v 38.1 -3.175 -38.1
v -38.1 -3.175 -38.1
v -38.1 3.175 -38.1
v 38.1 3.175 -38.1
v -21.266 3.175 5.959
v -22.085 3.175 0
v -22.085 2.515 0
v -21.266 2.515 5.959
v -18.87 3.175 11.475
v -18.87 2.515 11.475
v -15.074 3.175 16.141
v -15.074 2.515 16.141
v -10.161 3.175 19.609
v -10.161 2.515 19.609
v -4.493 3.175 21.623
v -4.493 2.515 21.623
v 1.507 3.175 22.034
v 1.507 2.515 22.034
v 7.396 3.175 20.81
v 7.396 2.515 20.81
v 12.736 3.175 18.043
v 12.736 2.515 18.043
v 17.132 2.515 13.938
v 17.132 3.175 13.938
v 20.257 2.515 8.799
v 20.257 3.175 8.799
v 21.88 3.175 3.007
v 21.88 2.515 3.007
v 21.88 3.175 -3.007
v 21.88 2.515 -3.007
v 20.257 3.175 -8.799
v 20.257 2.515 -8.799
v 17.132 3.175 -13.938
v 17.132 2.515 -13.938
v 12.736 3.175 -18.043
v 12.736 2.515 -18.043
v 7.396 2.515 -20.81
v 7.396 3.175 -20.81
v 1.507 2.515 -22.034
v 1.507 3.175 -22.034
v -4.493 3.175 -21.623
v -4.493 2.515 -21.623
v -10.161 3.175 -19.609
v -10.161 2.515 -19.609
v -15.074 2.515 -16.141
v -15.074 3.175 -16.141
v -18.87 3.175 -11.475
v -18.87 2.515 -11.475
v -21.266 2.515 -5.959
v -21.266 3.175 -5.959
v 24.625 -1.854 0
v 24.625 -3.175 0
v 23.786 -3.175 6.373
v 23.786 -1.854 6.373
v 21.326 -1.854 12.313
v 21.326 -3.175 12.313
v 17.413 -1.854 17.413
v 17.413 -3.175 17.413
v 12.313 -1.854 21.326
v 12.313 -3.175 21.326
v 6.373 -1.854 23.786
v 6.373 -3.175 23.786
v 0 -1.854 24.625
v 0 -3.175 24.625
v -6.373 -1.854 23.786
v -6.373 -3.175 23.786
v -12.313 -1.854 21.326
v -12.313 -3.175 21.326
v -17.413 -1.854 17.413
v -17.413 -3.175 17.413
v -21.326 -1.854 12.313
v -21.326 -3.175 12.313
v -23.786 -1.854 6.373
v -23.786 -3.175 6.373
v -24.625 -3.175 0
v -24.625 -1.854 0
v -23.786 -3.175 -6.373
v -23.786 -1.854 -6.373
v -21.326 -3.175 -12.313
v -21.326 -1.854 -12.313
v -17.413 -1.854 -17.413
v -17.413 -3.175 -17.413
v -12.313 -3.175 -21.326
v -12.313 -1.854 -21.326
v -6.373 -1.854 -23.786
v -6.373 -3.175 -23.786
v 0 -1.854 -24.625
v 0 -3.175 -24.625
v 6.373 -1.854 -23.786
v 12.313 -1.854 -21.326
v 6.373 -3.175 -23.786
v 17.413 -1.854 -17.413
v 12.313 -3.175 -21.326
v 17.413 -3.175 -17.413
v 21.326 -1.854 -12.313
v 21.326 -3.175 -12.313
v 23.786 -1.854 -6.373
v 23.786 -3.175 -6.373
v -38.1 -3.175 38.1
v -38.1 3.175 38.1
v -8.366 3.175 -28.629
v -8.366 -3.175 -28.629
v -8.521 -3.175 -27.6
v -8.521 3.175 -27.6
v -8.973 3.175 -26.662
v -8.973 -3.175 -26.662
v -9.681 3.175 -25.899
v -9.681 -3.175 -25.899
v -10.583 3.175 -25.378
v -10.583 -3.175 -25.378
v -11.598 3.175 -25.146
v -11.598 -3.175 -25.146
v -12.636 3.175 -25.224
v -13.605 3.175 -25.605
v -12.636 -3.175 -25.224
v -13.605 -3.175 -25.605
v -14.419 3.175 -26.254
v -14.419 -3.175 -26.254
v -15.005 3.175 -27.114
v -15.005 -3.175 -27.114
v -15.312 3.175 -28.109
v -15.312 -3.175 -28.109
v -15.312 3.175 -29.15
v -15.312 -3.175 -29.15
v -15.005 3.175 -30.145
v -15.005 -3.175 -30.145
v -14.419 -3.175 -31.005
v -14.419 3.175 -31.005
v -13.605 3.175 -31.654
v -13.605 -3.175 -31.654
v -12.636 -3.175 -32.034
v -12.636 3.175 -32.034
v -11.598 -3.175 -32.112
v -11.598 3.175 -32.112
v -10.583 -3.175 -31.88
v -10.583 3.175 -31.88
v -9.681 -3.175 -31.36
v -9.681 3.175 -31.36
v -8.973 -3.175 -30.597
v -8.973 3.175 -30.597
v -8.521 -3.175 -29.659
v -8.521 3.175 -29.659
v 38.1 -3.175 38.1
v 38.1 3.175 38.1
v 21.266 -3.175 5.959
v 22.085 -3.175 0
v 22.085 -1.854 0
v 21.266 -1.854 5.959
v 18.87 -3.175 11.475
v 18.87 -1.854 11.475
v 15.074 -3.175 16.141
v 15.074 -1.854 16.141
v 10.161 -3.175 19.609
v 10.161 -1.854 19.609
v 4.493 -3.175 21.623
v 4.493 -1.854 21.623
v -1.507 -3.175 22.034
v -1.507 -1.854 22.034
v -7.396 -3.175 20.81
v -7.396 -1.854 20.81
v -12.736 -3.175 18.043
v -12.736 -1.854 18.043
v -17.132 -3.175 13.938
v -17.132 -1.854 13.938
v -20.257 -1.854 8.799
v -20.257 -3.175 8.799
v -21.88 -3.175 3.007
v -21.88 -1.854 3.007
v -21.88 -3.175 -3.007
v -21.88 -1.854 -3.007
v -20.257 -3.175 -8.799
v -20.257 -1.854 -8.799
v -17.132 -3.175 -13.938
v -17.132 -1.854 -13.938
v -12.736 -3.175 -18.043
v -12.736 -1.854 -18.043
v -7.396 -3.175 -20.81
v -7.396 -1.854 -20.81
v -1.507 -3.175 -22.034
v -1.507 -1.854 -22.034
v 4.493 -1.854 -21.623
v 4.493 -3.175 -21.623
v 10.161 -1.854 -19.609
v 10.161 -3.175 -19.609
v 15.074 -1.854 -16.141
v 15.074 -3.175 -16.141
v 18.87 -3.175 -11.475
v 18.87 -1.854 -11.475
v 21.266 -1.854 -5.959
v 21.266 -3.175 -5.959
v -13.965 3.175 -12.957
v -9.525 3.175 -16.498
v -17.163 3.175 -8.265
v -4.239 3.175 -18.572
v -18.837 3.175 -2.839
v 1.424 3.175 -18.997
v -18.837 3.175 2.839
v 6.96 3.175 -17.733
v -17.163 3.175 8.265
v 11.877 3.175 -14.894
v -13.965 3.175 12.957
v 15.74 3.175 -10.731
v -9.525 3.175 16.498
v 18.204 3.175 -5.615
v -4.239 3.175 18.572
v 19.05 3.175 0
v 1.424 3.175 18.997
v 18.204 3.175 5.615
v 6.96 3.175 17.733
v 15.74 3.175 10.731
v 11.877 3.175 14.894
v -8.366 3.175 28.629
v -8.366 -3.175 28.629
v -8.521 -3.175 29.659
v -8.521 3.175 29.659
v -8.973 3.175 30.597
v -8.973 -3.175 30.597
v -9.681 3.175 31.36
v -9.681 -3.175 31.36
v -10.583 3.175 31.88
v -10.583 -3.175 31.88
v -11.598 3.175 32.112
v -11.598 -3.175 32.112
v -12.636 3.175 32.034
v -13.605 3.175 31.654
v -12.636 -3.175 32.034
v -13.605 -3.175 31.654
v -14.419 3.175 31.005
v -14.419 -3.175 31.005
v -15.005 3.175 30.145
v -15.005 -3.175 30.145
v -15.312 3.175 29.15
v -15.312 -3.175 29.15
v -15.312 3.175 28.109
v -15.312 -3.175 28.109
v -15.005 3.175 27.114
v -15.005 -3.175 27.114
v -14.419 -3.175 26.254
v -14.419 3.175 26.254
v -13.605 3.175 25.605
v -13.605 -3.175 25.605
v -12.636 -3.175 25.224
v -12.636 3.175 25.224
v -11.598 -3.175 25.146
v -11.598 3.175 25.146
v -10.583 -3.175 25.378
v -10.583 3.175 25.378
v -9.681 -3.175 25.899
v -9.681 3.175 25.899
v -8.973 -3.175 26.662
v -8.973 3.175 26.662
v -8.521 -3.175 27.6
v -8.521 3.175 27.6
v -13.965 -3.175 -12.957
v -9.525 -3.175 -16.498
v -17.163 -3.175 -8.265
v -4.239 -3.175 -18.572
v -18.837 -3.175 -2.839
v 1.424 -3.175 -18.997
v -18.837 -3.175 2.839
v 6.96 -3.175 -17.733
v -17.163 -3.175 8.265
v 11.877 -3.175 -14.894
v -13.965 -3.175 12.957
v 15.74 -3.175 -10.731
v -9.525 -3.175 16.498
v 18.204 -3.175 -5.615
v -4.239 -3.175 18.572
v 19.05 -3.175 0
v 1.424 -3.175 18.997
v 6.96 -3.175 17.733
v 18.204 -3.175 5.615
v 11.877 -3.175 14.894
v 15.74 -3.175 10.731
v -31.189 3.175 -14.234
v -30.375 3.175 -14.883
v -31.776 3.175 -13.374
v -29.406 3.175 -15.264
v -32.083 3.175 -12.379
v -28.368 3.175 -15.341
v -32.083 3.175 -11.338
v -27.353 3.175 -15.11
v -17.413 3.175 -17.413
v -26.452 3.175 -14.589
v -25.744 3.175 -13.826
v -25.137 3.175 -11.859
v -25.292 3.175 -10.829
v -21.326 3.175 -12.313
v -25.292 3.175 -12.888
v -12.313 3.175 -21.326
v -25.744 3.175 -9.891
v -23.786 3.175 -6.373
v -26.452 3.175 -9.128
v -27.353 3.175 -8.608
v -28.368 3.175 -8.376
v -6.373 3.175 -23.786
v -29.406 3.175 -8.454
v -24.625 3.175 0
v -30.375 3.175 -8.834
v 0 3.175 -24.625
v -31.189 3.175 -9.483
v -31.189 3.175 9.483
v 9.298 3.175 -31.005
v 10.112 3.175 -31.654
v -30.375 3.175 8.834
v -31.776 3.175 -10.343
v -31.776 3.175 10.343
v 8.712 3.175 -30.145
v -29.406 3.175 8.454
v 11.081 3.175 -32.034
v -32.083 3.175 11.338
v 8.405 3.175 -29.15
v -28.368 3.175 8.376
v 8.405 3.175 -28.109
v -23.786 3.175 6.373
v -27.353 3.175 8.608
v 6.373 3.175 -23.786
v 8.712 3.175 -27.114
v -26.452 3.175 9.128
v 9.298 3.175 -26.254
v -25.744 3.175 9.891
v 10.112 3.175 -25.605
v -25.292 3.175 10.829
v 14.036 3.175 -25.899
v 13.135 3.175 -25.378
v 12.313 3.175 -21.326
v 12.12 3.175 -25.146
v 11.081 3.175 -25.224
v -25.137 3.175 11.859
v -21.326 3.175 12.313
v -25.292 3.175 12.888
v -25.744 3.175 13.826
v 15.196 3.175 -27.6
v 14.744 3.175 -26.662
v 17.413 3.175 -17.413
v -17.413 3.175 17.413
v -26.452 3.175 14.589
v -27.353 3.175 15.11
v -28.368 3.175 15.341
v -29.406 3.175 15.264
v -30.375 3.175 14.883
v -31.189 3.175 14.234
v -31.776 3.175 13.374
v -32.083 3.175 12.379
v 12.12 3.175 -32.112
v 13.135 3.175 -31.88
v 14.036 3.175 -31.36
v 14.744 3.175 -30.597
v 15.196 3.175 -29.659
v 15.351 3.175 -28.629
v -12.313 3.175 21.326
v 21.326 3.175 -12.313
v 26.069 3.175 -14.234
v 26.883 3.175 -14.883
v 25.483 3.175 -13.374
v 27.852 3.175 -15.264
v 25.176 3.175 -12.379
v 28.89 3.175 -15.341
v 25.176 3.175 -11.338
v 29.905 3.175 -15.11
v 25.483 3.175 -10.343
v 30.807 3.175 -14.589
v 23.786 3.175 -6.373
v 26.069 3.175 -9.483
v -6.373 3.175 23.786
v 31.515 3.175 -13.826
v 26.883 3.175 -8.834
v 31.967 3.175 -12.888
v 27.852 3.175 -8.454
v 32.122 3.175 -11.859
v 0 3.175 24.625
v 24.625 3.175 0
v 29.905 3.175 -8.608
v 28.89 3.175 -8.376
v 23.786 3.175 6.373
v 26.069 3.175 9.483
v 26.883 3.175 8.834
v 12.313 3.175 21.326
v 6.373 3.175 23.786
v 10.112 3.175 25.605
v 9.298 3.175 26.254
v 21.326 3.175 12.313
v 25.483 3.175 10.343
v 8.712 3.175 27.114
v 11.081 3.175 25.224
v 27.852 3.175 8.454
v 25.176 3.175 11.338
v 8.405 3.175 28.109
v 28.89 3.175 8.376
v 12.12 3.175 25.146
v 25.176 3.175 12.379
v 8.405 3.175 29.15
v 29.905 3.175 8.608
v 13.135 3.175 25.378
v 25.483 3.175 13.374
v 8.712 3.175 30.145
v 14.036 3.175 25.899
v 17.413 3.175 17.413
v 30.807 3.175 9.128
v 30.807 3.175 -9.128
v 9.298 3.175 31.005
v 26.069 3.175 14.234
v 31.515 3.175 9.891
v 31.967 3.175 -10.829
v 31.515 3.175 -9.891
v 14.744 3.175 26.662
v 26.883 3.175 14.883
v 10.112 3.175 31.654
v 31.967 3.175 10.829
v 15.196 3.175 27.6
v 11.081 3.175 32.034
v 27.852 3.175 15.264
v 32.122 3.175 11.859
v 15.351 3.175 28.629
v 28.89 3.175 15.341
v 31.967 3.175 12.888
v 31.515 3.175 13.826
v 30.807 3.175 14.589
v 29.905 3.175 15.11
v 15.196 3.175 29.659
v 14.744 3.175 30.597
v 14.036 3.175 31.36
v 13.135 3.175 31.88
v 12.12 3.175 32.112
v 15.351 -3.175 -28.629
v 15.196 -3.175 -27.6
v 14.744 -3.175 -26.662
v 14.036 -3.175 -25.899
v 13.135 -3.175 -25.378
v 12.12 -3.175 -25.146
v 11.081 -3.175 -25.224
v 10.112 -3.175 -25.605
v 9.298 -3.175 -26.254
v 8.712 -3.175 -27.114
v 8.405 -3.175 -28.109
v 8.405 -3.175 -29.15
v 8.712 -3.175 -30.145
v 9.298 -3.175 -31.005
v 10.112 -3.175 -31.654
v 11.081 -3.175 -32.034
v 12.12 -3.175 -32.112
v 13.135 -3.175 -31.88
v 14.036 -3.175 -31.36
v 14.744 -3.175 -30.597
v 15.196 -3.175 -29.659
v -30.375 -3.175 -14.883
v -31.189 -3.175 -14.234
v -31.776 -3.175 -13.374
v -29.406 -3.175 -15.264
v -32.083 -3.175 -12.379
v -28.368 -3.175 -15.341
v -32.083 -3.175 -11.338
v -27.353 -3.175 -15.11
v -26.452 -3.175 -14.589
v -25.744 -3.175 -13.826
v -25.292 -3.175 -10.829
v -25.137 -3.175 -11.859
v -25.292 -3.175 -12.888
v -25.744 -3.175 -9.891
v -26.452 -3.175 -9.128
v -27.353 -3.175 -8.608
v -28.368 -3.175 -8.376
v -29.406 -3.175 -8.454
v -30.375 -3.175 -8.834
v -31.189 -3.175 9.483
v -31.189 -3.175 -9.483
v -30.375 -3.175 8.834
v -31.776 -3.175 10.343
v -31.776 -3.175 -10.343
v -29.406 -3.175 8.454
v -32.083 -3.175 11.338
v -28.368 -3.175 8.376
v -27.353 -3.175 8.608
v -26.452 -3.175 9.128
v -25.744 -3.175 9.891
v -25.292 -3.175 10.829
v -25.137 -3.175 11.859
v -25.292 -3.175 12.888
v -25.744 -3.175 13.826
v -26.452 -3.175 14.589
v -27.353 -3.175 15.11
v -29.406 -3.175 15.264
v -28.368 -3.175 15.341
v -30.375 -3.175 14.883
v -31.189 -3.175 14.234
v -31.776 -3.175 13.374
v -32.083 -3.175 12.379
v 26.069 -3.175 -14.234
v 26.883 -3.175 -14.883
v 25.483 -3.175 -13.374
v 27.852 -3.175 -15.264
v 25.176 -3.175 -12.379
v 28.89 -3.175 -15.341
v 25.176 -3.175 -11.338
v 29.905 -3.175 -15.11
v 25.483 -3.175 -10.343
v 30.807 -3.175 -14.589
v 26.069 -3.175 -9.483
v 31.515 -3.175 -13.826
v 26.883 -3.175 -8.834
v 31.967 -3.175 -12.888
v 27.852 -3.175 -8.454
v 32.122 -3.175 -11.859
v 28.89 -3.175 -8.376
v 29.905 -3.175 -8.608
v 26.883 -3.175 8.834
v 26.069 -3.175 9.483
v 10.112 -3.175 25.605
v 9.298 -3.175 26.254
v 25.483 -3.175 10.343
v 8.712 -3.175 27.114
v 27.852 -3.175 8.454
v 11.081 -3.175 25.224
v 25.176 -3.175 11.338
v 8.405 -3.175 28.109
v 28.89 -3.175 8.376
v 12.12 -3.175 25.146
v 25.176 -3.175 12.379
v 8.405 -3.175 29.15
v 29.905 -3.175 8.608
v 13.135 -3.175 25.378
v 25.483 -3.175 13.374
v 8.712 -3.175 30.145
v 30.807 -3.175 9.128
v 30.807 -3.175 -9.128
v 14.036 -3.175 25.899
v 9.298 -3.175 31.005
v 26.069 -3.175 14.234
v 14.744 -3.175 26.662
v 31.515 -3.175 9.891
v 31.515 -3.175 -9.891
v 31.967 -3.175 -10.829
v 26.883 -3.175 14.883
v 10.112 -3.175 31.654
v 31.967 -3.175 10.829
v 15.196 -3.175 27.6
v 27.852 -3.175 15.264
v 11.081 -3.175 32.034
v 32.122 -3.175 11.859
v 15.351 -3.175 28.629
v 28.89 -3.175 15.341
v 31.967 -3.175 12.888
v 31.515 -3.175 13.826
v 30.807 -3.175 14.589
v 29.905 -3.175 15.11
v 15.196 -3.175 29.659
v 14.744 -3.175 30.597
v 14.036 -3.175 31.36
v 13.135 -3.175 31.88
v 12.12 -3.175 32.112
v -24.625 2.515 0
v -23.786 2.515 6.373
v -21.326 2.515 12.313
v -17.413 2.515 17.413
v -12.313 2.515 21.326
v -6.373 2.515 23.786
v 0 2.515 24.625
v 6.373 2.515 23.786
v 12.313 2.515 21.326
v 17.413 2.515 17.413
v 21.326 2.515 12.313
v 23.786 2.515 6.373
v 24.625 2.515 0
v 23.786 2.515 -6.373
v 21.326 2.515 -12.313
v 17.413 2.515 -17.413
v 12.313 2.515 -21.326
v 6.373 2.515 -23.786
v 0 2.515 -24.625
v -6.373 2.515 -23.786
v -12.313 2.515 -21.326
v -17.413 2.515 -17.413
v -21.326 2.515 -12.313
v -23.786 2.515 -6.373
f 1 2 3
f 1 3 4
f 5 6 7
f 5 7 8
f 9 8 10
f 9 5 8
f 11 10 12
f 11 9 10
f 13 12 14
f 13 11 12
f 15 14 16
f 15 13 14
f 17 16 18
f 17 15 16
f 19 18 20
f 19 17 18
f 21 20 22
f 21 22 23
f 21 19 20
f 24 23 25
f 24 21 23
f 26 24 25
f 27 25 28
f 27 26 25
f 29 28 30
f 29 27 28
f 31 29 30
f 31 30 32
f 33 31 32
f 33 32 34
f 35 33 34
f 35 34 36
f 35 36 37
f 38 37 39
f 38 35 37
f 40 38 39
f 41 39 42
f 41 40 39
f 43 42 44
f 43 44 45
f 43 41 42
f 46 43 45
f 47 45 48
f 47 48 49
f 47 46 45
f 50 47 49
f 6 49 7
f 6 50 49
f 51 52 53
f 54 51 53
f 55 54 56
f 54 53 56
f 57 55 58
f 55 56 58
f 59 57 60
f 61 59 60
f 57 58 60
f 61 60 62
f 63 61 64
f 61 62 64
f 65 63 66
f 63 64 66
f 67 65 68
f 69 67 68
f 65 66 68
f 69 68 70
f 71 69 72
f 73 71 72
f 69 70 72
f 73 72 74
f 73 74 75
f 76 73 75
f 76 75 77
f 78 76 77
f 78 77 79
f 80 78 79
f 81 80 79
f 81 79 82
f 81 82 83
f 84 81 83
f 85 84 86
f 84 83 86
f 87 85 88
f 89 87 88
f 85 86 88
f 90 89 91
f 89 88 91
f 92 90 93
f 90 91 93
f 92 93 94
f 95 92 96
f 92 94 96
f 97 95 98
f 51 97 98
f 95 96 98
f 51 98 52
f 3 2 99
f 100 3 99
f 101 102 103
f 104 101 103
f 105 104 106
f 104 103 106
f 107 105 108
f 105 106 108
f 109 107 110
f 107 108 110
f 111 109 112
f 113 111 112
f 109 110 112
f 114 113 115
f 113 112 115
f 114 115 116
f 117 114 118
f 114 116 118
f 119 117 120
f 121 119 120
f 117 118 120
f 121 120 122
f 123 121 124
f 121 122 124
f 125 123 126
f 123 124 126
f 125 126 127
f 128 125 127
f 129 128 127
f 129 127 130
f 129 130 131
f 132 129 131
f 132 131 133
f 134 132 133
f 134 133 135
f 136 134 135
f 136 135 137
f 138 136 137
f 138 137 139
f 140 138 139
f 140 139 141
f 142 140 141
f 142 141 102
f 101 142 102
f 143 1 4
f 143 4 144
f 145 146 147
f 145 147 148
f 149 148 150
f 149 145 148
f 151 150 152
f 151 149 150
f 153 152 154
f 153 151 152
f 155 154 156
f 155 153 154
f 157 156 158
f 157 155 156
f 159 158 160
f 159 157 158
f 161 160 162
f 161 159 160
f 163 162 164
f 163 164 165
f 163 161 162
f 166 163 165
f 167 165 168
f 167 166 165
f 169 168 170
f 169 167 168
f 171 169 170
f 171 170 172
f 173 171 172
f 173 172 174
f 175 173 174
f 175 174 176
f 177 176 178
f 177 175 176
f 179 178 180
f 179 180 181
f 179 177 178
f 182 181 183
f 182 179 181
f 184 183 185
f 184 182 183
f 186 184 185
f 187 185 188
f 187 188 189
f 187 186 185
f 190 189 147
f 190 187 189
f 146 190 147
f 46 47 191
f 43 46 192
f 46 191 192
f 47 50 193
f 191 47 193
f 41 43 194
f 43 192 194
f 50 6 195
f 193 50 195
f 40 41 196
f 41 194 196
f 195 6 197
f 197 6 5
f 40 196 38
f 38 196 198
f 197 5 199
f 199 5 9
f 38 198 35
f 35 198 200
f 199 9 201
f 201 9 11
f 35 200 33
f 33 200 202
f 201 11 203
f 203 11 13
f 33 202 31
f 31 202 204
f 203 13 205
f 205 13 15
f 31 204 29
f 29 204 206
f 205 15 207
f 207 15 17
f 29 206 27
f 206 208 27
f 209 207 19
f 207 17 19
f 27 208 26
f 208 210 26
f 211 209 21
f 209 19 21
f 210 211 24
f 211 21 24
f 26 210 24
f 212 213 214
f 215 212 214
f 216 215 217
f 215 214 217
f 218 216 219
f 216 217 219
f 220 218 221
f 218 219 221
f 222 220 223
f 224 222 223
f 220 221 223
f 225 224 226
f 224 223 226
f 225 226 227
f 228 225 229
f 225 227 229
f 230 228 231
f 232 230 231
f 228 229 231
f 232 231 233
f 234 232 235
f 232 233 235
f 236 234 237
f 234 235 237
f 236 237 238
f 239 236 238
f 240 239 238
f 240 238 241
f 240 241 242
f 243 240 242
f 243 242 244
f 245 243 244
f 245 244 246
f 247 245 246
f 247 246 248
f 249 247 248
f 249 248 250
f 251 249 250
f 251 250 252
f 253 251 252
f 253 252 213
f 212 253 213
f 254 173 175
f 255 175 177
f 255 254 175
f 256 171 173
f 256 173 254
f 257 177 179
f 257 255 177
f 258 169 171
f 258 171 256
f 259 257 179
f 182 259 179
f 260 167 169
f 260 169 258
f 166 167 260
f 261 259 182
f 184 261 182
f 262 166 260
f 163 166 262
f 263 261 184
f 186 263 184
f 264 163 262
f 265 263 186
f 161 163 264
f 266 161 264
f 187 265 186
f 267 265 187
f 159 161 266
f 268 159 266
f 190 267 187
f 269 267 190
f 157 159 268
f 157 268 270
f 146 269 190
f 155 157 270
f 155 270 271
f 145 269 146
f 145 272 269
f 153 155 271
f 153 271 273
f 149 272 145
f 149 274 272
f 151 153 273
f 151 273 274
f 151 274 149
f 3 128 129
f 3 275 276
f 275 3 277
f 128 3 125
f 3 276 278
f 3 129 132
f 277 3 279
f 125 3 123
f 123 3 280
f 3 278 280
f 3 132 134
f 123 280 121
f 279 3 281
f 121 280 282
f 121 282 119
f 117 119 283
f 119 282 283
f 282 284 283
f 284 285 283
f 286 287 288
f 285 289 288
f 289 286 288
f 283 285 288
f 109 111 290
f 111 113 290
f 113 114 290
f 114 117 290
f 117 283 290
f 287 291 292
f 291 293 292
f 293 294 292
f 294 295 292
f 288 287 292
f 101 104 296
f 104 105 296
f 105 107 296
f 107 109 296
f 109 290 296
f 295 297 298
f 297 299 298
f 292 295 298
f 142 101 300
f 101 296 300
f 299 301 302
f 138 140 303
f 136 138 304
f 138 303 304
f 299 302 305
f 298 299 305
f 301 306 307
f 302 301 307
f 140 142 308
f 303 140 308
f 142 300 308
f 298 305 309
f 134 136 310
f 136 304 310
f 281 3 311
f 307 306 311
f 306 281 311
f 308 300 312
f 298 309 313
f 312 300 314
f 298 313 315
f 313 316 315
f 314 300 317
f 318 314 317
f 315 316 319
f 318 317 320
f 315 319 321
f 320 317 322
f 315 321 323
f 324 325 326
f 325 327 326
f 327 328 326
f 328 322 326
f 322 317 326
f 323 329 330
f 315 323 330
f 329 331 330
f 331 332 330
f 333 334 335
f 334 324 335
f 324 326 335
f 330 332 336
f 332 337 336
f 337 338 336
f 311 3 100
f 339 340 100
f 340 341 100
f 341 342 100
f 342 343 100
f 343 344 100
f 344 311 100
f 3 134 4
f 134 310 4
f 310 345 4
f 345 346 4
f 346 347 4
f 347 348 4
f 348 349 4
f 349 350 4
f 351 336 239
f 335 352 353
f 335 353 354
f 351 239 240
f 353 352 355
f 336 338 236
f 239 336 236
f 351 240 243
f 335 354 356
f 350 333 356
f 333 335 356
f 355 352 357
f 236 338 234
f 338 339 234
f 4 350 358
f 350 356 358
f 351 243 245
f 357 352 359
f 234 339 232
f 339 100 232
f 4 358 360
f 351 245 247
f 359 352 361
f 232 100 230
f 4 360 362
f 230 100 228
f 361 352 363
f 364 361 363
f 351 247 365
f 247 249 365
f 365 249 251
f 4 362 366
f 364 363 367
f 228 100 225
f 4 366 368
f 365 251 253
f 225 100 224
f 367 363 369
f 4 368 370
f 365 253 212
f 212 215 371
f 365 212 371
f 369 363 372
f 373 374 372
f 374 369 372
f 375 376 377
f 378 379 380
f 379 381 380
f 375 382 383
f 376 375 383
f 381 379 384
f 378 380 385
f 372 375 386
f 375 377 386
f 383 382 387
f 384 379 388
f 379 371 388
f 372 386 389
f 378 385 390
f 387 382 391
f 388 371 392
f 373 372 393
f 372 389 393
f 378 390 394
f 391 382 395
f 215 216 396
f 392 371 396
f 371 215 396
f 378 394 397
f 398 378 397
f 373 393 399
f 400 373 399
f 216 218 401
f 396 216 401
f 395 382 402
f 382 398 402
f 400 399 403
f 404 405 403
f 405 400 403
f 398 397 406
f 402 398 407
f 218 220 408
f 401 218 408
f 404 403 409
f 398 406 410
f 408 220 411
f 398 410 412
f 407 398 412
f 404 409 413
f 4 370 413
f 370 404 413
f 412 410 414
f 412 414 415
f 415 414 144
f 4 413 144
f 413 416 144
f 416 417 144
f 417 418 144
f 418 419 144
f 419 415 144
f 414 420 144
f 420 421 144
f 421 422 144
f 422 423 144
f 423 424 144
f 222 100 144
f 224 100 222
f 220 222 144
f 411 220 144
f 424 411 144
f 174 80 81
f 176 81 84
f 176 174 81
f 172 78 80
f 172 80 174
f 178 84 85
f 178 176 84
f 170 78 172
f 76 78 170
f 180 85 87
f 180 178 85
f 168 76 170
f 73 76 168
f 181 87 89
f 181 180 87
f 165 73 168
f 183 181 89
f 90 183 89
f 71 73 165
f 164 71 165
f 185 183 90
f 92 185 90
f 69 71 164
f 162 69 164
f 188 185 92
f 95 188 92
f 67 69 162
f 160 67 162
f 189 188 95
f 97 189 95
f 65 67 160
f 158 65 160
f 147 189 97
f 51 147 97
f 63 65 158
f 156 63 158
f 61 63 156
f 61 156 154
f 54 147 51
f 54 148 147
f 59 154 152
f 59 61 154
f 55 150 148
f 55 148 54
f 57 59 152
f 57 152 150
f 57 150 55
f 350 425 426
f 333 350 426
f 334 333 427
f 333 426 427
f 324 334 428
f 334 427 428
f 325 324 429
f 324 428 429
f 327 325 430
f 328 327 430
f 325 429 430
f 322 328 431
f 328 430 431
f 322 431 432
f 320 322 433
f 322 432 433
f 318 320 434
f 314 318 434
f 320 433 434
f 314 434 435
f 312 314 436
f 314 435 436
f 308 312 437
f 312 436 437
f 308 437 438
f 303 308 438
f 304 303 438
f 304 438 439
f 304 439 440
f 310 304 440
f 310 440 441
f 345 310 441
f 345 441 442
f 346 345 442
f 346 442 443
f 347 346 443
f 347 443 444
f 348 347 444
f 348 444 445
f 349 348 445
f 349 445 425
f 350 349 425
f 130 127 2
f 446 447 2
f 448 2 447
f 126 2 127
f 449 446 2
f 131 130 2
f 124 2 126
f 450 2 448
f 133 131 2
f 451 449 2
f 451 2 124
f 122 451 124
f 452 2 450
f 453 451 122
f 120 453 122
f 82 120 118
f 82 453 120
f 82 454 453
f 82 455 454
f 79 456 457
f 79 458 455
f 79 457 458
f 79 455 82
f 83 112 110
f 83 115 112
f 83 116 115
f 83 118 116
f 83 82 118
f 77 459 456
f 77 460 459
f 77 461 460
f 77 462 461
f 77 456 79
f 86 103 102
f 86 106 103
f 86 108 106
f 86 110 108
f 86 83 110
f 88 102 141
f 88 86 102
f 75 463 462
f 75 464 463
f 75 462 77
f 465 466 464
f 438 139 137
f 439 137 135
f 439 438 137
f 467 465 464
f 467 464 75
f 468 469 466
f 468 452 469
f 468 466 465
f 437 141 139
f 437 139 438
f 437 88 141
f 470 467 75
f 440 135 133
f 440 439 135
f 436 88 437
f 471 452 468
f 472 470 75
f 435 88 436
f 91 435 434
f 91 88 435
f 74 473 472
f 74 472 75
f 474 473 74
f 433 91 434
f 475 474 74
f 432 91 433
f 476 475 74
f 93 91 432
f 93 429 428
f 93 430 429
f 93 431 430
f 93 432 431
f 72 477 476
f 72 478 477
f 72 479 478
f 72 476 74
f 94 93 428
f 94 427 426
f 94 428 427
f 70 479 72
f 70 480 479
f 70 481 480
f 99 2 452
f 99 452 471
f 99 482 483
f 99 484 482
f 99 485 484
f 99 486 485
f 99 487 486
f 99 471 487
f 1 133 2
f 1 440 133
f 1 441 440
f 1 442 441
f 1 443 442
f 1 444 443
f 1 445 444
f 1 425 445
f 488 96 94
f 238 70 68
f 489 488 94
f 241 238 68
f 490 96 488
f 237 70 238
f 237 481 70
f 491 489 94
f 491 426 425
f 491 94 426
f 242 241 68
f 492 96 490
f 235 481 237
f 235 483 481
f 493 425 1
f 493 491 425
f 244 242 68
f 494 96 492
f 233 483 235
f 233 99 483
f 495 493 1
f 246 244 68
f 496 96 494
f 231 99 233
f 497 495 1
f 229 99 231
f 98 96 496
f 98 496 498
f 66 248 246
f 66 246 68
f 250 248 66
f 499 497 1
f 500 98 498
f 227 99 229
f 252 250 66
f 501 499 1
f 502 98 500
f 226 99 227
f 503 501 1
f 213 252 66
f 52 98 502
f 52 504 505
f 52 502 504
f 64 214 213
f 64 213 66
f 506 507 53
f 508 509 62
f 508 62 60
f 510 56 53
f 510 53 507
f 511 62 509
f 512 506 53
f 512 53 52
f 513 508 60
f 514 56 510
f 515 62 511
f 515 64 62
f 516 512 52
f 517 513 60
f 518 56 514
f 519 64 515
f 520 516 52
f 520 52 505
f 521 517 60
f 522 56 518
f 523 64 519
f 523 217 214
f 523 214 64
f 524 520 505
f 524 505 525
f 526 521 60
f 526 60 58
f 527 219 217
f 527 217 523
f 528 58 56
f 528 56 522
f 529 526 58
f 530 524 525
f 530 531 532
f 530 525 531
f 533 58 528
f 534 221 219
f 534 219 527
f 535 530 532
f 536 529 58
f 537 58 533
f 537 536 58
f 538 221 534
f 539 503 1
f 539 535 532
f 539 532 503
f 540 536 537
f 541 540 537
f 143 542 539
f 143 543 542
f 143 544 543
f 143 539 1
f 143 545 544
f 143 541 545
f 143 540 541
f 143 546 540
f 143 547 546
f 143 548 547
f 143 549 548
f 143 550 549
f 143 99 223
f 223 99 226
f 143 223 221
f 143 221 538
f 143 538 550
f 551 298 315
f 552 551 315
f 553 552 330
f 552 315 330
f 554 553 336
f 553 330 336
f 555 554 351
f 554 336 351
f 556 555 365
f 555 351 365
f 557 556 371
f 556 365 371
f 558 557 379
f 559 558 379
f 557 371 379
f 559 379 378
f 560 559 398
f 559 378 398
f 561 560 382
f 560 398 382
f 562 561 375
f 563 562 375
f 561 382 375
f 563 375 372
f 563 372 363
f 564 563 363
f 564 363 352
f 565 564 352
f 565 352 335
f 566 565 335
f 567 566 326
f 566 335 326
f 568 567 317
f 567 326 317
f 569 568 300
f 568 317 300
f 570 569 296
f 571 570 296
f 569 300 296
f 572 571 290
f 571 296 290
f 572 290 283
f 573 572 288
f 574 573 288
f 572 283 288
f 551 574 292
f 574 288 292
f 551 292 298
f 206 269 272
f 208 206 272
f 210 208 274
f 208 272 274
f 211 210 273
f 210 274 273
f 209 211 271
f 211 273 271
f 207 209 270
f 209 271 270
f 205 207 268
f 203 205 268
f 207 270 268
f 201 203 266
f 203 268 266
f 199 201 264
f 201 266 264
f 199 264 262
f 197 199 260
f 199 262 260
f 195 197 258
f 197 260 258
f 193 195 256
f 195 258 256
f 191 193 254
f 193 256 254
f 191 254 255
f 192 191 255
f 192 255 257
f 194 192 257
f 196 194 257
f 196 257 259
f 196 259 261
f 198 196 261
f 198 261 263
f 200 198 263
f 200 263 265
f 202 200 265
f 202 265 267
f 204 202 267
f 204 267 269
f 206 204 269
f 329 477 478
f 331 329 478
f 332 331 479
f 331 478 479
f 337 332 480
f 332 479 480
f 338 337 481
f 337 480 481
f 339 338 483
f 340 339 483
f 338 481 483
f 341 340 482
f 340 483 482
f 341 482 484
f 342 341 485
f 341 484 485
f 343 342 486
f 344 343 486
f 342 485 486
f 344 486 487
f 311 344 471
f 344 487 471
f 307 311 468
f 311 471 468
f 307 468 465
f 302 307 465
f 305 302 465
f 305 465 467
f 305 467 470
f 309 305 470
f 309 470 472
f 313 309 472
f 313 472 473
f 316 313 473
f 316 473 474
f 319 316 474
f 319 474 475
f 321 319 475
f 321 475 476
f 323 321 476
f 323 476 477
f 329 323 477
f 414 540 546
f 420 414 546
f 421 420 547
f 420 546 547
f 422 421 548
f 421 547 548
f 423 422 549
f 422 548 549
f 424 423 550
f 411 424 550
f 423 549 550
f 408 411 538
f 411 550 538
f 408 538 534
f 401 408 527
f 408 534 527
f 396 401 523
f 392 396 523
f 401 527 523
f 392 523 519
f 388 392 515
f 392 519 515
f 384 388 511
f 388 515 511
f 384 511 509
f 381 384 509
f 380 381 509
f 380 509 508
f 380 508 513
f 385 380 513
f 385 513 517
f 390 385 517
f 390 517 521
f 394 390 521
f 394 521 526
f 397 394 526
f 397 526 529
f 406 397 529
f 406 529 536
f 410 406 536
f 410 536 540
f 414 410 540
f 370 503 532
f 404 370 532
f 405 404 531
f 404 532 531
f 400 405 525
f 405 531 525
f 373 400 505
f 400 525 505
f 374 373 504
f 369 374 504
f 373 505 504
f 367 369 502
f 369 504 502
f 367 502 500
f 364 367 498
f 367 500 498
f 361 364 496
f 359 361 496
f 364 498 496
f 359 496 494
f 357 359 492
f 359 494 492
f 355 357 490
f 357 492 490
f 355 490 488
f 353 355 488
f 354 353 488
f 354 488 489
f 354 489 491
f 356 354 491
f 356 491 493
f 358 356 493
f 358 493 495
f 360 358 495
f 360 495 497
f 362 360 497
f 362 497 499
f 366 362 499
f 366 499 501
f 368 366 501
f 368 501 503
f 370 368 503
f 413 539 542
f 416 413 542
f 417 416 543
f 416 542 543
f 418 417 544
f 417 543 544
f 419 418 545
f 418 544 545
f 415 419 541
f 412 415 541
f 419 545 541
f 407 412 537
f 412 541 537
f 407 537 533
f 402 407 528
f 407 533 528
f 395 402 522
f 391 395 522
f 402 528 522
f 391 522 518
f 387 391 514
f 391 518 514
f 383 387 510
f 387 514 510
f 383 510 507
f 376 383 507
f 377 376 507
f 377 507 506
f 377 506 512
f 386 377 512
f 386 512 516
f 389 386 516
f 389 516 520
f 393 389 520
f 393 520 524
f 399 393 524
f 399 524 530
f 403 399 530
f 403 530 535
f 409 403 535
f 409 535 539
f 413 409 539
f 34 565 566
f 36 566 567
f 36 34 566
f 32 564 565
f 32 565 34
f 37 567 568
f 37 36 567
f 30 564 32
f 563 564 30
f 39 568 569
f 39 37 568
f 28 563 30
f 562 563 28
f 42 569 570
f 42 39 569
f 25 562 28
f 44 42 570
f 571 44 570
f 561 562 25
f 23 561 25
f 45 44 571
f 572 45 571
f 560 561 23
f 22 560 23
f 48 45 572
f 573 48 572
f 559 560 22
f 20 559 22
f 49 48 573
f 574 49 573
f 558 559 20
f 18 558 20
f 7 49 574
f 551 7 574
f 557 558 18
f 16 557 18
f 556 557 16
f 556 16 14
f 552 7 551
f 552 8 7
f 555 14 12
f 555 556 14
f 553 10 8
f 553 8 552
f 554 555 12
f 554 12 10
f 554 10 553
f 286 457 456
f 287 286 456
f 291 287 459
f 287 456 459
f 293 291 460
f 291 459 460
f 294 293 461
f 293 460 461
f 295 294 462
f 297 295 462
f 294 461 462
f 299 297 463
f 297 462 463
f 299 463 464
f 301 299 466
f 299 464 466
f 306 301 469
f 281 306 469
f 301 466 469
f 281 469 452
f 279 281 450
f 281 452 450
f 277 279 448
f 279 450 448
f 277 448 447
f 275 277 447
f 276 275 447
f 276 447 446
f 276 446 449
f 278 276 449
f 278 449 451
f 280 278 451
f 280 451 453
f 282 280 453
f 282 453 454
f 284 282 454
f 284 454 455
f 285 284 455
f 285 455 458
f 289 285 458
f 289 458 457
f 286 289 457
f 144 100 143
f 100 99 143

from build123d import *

# Parameters (mm, degrees)
F0_W     = 76.2
F0_H     = 76.2
F1_DEPTH = 3.175
F2_R     = 3.4925
F3_DEPTH = 25.4
F4_R     = 19.05
F5_DEPTH = 25.4
F6_R     = 24.6253
F6_R_2   = 22.0853
F7_DEPTH = 1.3208
F8_R     = 24.6253
F8_R_2   = 22.0853
F9_DEPTH = 0.6604


with BuildPart() as f1:
    # F0 (on Front) → F1 (new body, symmetric)
    with BuildSketch(Plane.XZ):
        Rectangle(F0_W, F0_H)
    extrude(amount=F1_DEPTH, both=True)

    # F2 (on face) → F3 (cut)
    with BuildSketch(Plane.XZ.offset(3.175)):
        with Locations((11.8585942021, 28.6291789535)):
            Circle(F2_R)
        with Locations((-11.8585942021, 28.6291789535)):
            Circle(F2_R)
        with Locations((-28.6291789535, 11.8585942021)):
            Circle(F2_R)
        with Locations((-28.6291789535, -11.8585942021)):
            Circle(F2_R)
        with Locations((-11.8585942021, -28.6291789535)):
            Circle(F2_R)
        with Locations((11.8585942021, -28.6291789535)):
            Circle(F2_R)
        with Locations((28.6291789535, -11.8585942021)):
            Circle(F2_R)
        with Locations((28.6291789535, 11.8585942021)):
            Circle(F2_R)
    extrude(amount=-F3_DEPTH, mode=Mode.SUBTRACT)

    # F4 (on face) → F5 (cut)
    with BuildSketch(Plane.XZ.offset(3.175)):
        Circle(F4_R)
    extrude(amount=-F5_DEPTH, mode=Mode.SUBTRACT)

    # F6 (on face) → F7 (cut)
    with BuildSketch(Plane.XZ.offset(3.175)):
        Circle(F6_R)
        Circle(F6_R_2, mode=Mode.SUBTRACT)
    extrude(amount=-F7_DEPTH, mode=Mode.SUBTRACT)

    # F8 (on face) → F9 (cut)
    with BuildSketch(Plane(origin=(0, 3.175, 0), x_dir=(-1, 0, 0), z_dir=(0, 1, 0))):
        Circle(F8_R)
        Circle(F8_R_2, mode=Mode.SUBTRACT)
    extrude(amount=-F9_DEPTH, mode=Mode.SUBTRACT)


solid = f1.part
